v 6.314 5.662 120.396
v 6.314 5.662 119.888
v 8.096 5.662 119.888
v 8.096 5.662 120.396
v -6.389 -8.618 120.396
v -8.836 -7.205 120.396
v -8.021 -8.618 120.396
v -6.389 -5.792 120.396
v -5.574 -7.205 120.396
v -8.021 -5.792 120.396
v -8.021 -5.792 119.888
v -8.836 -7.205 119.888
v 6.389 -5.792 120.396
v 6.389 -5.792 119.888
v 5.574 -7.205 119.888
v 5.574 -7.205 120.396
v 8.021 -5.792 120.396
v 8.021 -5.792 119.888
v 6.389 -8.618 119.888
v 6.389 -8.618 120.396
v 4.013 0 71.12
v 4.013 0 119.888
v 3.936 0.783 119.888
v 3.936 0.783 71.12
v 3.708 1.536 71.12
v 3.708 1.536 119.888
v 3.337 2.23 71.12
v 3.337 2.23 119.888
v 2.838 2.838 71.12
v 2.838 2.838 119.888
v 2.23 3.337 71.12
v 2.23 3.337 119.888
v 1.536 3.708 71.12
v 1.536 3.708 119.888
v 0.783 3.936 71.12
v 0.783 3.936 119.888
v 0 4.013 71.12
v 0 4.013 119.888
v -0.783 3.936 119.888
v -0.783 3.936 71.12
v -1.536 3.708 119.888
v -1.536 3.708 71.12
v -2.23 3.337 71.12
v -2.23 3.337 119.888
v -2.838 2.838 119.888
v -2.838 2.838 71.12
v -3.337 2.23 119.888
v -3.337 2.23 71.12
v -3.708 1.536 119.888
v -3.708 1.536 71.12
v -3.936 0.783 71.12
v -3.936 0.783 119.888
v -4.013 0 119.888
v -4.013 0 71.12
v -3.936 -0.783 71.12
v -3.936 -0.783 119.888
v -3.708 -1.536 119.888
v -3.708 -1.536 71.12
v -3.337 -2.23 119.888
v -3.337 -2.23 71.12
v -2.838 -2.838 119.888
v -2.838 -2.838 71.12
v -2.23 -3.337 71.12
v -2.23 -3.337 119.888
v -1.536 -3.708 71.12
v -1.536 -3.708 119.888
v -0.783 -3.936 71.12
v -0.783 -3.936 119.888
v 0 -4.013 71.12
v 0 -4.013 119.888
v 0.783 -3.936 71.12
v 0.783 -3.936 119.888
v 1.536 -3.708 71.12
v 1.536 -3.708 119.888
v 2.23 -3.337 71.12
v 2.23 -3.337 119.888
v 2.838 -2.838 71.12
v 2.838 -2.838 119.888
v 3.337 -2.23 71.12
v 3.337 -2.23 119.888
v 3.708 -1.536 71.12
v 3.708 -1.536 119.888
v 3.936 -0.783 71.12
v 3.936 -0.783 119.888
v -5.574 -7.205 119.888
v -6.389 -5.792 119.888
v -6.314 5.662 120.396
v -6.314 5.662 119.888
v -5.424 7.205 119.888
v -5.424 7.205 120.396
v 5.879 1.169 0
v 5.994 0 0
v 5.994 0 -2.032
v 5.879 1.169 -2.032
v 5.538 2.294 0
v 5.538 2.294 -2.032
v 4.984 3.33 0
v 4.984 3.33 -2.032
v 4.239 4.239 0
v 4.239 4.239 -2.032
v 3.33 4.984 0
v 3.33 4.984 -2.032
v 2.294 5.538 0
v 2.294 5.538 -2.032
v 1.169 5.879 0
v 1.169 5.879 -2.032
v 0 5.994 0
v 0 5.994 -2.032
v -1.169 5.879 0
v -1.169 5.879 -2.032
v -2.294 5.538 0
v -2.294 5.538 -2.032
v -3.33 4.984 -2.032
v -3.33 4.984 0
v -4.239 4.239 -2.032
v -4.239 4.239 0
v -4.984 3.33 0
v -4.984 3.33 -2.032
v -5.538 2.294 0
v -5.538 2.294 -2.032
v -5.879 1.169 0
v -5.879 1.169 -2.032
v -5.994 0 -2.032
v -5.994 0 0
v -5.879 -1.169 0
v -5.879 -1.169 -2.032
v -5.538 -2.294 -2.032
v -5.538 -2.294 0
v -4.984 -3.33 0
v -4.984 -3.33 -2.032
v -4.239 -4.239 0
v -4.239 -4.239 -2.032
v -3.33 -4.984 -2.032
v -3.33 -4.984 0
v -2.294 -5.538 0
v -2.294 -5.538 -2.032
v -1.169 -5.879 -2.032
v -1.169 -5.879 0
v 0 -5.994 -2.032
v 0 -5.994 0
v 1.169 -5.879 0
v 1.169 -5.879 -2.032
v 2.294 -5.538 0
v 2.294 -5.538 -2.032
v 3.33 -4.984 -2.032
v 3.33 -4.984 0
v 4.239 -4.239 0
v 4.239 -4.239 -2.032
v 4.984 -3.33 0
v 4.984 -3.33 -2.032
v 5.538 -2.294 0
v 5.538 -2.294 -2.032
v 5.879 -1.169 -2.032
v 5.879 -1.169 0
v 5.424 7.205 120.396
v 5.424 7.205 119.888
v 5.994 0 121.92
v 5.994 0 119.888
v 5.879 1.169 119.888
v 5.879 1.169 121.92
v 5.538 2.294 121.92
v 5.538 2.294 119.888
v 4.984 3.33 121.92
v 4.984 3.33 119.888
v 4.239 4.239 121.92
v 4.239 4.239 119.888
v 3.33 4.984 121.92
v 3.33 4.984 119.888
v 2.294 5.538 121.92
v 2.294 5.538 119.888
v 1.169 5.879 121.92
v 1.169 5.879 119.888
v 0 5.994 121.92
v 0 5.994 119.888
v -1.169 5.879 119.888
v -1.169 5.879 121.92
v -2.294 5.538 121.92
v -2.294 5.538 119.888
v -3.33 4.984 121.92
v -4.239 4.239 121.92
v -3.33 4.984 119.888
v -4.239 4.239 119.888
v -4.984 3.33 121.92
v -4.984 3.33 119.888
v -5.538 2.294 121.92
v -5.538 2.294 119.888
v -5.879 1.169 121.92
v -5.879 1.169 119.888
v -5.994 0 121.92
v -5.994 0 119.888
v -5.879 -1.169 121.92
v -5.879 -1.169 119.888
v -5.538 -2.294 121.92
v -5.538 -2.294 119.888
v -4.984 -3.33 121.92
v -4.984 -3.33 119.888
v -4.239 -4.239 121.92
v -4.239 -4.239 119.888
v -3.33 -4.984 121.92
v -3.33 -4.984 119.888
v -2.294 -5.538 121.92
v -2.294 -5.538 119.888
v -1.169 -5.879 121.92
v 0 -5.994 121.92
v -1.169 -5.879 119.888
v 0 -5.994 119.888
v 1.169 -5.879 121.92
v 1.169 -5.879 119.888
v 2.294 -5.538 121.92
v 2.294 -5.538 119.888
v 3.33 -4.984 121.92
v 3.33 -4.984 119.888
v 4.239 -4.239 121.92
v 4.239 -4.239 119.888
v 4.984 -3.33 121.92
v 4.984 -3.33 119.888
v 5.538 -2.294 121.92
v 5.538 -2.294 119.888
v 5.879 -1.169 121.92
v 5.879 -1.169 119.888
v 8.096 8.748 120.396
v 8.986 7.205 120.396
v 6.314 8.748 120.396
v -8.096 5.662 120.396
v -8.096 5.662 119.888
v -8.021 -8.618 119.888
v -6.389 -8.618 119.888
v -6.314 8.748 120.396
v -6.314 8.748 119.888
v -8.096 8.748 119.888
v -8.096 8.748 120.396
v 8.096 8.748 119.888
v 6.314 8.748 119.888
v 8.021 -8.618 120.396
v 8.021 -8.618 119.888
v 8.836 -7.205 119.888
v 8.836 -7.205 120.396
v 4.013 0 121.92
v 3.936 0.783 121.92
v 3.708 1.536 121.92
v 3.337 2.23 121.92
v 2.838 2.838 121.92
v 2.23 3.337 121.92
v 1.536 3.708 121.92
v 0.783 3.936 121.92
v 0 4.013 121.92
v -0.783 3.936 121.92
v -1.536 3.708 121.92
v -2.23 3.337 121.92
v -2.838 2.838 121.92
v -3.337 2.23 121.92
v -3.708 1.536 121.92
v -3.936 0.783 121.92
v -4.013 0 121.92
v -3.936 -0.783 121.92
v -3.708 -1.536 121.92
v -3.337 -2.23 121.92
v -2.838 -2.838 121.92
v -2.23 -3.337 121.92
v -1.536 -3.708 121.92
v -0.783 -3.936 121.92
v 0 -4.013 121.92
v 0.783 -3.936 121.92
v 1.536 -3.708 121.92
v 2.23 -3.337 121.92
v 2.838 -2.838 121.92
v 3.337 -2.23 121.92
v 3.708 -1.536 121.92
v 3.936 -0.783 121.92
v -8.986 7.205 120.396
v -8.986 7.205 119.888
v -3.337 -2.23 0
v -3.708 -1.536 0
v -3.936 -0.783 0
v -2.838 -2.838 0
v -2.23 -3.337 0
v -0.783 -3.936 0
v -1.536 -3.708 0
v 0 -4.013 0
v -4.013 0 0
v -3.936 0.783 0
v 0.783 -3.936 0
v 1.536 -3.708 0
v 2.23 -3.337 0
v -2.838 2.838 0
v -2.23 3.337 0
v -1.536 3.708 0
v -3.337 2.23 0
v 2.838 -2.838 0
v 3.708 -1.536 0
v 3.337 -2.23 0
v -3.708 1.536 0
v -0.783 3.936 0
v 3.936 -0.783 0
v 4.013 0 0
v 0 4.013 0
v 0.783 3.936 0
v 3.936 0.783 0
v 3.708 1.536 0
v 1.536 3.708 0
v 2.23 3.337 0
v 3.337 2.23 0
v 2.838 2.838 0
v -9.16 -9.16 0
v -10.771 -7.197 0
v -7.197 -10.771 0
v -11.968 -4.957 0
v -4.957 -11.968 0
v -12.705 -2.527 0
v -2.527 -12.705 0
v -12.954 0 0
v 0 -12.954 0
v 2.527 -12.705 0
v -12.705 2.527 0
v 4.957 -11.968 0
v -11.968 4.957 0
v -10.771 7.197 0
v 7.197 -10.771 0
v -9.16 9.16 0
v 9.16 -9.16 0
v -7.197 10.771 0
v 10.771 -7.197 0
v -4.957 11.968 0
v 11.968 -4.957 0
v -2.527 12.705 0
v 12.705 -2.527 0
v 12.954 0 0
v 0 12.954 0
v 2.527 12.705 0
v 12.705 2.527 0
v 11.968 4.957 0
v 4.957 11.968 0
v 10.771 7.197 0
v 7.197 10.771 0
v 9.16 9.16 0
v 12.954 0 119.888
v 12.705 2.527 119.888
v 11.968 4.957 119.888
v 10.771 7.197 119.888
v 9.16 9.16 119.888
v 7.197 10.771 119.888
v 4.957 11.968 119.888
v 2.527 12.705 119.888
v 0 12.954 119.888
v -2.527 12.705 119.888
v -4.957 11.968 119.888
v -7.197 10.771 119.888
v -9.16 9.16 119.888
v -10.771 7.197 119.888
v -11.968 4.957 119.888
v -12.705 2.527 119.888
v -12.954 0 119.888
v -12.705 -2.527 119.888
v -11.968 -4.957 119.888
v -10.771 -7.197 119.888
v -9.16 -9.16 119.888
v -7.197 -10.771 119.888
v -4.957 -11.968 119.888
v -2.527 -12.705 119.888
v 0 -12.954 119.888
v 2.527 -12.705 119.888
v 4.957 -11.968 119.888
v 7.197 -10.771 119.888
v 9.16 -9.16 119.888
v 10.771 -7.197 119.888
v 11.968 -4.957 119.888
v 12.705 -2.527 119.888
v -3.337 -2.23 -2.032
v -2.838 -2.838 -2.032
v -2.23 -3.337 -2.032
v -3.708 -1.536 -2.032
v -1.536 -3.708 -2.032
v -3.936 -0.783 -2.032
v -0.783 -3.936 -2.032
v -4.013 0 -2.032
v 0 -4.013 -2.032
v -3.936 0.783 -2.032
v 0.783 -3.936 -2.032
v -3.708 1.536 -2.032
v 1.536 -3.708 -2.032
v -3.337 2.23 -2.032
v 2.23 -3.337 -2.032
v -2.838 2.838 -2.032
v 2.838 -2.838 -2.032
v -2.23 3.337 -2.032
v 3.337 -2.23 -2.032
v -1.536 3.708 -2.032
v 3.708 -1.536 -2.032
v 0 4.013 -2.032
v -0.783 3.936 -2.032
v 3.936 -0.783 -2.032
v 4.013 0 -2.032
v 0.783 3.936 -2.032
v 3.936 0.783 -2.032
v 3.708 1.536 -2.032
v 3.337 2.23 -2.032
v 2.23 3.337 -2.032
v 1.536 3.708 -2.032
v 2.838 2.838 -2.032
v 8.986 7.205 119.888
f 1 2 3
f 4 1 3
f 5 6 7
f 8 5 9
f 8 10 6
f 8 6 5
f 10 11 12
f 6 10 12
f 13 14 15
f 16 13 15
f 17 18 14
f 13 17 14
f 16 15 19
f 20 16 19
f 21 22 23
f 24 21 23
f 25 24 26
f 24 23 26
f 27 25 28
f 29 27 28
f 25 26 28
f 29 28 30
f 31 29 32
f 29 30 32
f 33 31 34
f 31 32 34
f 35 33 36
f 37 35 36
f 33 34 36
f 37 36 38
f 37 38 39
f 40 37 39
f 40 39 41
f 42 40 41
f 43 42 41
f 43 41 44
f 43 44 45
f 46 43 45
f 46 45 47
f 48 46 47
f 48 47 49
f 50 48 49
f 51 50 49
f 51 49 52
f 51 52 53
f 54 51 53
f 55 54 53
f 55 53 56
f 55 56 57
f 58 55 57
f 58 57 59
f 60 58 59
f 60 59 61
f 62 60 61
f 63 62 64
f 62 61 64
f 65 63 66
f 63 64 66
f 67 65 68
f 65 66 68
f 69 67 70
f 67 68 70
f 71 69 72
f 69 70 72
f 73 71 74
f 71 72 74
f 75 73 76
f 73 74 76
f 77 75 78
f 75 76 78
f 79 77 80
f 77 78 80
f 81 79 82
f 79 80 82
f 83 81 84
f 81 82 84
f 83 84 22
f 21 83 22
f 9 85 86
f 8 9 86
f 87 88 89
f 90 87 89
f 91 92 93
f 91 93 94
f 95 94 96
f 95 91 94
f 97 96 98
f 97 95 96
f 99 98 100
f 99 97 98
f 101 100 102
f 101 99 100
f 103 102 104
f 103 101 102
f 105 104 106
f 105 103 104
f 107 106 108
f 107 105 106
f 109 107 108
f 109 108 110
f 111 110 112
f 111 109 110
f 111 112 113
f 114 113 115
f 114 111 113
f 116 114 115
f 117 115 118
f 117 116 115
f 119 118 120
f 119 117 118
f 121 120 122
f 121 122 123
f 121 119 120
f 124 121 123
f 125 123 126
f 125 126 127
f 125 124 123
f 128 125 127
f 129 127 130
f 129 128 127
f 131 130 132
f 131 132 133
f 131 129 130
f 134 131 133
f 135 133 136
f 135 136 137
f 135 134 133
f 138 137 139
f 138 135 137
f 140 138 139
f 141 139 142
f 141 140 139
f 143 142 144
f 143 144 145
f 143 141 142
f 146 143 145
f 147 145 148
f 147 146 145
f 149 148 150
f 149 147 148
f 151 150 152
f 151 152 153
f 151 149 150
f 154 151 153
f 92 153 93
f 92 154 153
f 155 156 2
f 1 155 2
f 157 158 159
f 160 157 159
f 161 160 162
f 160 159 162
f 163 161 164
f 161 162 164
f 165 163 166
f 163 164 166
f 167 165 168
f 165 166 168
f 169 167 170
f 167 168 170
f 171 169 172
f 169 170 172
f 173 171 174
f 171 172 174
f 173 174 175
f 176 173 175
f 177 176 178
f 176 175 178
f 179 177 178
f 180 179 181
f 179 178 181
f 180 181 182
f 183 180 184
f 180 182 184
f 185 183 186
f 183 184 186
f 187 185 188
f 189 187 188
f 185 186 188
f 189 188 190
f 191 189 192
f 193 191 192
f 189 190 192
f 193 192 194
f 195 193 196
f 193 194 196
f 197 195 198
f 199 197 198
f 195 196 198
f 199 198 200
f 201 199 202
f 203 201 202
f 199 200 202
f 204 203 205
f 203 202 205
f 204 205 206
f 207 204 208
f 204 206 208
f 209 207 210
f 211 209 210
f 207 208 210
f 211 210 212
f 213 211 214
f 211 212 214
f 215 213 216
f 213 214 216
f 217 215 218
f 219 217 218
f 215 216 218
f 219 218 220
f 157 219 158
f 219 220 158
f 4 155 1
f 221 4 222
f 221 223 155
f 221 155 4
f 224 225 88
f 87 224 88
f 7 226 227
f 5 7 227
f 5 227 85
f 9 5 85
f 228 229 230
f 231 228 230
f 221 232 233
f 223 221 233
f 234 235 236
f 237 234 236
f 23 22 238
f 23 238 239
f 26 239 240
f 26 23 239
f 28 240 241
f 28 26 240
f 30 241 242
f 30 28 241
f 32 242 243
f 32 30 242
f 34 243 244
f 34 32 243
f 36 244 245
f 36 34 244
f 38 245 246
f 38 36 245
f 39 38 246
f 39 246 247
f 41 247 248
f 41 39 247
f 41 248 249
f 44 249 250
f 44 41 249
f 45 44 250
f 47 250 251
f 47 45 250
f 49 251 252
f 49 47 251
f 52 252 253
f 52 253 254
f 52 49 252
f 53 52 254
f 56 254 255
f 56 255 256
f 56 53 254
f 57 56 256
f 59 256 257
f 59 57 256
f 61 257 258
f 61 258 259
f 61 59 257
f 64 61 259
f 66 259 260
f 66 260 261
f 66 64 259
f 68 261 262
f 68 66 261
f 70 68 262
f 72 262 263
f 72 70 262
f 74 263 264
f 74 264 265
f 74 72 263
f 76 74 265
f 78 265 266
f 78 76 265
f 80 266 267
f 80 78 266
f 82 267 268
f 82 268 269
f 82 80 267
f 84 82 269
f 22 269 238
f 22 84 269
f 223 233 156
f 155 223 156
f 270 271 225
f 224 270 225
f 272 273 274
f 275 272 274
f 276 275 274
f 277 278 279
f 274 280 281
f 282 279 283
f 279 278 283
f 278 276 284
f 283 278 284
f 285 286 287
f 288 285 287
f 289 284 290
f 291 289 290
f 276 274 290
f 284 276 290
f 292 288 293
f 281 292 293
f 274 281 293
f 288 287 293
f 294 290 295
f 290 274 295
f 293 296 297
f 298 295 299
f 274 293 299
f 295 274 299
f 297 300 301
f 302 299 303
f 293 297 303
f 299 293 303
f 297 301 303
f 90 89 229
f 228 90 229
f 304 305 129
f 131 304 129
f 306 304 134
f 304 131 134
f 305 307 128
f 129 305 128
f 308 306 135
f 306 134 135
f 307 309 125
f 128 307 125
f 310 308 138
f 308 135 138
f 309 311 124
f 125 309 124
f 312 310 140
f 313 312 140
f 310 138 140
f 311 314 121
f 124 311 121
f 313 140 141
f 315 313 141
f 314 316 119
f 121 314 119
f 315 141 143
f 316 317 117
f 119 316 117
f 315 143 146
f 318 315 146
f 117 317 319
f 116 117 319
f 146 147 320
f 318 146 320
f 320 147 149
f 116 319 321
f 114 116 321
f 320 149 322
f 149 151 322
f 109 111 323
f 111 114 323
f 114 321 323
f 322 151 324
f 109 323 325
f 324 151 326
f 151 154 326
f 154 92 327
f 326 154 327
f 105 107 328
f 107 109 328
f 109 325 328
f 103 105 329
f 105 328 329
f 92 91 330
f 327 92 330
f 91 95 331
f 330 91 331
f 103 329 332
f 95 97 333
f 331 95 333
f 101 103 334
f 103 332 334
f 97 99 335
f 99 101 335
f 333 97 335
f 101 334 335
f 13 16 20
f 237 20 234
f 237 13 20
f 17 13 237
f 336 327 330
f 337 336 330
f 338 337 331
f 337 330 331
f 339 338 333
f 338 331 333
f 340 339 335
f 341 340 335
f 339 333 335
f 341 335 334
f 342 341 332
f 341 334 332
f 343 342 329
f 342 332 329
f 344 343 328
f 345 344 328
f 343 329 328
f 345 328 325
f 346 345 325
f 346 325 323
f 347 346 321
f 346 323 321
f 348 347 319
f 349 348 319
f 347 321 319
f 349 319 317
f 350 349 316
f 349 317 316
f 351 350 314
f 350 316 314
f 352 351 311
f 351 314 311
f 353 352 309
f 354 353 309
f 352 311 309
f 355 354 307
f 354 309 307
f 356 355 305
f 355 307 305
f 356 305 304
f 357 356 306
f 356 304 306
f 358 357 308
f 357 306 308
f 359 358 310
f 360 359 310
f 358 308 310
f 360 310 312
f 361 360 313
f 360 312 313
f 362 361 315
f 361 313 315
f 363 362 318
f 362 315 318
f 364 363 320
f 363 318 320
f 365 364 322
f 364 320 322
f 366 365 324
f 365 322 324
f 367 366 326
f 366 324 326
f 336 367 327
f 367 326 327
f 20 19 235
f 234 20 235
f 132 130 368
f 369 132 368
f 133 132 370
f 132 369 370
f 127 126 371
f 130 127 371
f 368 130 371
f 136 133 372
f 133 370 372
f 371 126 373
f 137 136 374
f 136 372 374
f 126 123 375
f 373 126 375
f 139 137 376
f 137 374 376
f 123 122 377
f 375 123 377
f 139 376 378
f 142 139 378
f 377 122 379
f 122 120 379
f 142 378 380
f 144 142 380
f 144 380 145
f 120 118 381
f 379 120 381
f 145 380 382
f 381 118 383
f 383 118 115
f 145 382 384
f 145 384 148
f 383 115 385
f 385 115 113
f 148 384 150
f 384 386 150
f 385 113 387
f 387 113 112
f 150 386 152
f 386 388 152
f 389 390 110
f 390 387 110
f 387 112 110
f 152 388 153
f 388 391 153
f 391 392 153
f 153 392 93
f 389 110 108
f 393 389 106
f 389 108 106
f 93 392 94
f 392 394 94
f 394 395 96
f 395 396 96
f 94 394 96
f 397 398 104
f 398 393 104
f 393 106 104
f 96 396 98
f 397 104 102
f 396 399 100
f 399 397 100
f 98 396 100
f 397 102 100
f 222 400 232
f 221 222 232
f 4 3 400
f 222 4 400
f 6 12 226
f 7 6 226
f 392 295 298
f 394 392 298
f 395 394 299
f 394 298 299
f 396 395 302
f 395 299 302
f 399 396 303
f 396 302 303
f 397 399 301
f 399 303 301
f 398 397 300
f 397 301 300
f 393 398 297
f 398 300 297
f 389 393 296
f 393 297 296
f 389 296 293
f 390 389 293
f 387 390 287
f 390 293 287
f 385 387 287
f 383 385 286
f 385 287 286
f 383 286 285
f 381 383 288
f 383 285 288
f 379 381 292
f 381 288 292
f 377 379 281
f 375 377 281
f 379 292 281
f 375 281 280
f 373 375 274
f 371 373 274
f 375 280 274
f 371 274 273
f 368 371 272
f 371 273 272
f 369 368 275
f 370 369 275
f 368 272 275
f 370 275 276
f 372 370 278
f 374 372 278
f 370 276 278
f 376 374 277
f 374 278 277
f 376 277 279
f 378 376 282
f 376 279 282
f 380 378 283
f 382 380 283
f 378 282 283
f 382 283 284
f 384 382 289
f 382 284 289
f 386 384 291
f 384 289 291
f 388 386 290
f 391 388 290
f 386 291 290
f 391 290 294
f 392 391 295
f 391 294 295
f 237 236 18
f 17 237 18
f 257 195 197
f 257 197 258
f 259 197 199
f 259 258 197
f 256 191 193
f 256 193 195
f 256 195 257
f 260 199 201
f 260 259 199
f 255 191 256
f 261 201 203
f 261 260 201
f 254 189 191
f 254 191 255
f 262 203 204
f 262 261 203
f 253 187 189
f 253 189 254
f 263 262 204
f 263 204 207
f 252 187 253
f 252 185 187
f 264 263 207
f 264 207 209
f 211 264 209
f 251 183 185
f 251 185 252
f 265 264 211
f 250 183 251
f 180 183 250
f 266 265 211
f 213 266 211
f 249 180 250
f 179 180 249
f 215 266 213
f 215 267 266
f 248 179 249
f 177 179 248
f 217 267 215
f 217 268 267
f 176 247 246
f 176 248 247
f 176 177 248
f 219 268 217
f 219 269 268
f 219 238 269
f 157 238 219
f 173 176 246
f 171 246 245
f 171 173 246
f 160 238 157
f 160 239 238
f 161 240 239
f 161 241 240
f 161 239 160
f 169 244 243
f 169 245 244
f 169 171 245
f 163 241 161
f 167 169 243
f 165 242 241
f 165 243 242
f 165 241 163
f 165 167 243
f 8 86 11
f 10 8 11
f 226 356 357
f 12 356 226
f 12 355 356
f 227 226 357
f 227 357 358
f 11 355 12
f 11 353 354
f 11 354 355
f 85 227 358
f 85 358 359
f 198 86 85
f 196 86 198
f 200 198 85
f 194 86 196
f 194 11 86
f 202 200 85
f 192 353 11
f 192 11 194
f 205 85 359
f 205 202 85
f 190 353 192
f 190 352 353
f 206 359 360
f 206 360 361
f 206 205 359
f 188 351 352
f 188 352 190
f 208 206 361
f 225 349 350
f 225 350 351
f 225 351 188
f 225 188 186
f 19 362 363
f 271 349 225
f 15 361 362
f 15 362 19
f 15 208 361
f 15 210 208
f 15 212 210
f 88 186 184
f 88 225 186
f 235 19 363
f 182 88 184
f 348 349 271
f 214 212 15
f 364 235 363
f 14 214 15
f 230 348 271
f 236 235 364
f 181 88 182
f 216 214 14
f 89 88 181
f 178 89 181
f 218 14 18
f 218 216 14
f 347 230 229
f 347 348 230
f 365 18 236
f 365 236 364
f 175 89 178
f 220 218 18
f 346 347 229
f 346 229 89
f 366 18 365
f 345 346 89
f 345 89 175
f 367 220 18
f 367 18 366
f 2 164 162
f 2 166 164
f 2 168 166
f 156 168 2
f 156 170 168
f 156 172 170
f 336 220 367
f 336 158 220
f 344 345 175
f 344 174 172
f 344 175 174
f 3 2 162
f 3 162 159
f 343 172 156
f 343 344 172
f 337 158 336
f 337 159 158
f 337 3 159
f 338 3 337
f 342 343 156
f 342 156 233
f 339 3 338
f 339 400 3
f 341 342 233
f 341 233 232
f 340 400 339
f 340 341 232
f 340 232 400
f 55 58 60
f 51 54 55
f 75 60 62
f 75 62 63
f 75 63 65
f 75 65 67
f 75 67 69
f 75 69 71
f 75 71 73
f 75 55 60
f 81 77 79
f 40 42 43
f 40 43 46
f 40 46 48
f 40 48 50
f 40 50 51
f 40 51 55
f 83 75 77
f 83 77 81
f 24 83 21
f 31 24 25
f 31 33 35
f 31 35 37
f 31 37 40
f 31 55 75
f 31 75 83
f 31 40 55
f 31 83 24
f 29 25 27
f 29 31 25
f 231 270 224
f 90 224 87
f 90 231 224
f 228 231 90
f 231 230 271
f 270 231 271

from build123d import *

# Parameters (mm, degrees)
F0_R      = 12.954
F0_R_2    = 5.9944
F0_R_3    = 4.0132
F1_DEPTH  = 119.888
F2_R      = 5.9944
F2_R_2    = 4.0132
F3_DEPTH  = 2.032
F5_R      = 5.9944
F5_R_2    = 4.0132
F6_DEPTH  = 2.032
F7_R      = 4.0132
F8_DEPTH  = 50.8
F10_DEPTH = 0.508


# Not quite as in the source:
# - the program builds the solid bodies; features that only make, move or delete a surface that nothing else refers to are left out


with BuildPart() as f1:
    # F0 (on Top) → F1 (new body)
    with BuildSketch(Plane.XY):
        Circle(F0_R)
        Circle(F0_R_2, mode=Mode.SUBTRACT)
        Circle(F0_R_2)
        Circle(F0_R_3, mode=Mode.SUBTRACT)
        Circle(F0_R_3)
    extrude(amount=F1_DEPTH)

    # F2 (on face) → F3 (join)
    with BuildSketch(Plane.XY.offset(119.888)):
        Circle(F2_R)
        Circle(F2_R_2, mode=Mode.SUBTRACT)
    extrude(amount=F3_DEPTH)

    # F5 (on face) + F0 (on Top) → F6 (join)
    with BuildSketch(Plane.XY):
        Circle(F5_R)
        Circle(F5_R_2, mode=Mode.SUBTRACT)
    with BuildSketch(Plane.XY):
        Circle(F0_R_2)
        Circle(F0_R_3, mode=Mode.SUBTRACT)
    extrude(amount=-F6_DEPTH)

    # F7 (on face) → F8 (cut)
    with BuildSketch(Plane.XY.offset(121.92)):
        Circle(F7_R)
    extrude(amount=-F8_DEPTH, mode=Mode.SUBTRACT)

    # F9 (on face) → F10 (join)
    with BuildSketch(Plane.XY.offset(119.888)):
        Polygon((5.5737421783, -7.205022499), (7.205022499, -7.205022499), (7.205022499, -5.7922923006), (6.3893823387, -5.7922923006), align=None)
        Polygon((7.205022499, -5.7922923006), (7.205022499, -7.205022499), (5.5737421783, -7.205022499), (6.3893823387, -8.6177526973), (8.0206626593, -8.6177526973), (8.8363028196, -7.205022499), (8.0206626593, -5.7922923006), align=None)
        Polygon((-6.3893823387, -8.6177526973), (-5.5737421783, -7.205022499), (-7.205022499, -7.205022499), (-7.205022499, -5.7922923006), (-8.0206626593, -5.7922923006), (-8.8363028196, -7.205022499), (-8.0206626593, -8.6177526973), align=None)
        Polygon((-7.205022499, -7.205022499), (-5.5737421783, -7.205022499), (-6.3893823387, -5.7922923006), (-7.205022499, -5.7922923006), align=None)
        Polygon((-7.205022499, 7.205022499), (-7.205022499, 5.6622778066), (-6.3143184355, 5.6622778066), (-5.4236143721, 7.205022499), align=None)
        Polygon((-8.0957265624, 5.6622778066), (-7.205022499, 5.6622778066), (-7.205022499, 7.205022499), (-5.4236143721, 7.205022499), (-6.3143184355, 8.7477671914), (-8.0957265624, 8.7477671914), (-8.9864306259, 7.205022499), align=None)
        Polygon((7.205022499, 7.205022499), (7.205022499, 5.6622778066), (8.0957265624, 5.6622778066), (8.9864306259, 7.205022499), (8.0957265624, 8.7477671914), (6.3143184355, 8.7477671914), (5.4236143721, 7.205022499), align=None)
        Polygon((6.3143184355, 5.6622778066), (7.205022499, 5.6622778066), (7.205022499, 7.205022499), (5.4236143721, 7.205022499), align=None)
    extrude(amount=F10_DEPTH)


solid = f1.part
